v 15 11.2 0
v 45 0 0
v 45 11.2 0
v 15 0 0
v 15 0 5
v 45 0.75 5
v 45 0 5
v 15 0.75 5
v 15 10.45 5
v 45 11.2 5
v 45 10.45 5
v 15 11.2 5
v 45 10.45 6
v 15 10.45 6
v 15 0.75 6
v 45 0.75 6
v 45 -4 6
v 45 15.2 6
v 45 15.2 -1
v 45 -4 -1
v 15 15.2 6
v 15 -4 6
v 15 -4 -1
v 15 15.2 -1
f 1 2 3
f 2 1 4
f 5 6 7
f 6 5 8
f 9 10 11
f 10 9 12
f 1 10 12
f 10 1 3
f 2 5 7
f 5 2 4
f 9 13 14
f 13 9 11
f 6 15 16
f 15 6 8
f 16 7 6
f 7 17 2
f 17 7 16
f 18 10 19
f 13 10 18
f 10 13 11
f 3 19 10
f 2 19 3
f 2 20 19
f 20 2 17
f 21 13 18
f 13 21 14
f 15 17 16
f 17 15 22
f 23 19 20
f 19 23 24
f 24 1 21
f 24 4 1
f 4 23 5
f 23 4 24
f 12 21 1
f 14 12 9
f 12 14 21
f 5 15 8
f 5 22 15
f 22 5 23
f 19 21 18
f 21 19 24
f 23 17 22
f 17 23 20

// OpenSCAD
ease=.2;
feetZ = 5;
feetH = 11+ease;
featfeetZ=feetZ+2;
featfeetH=4;


module feetShape(){
	polygon(points=[[0,0],
					[60,0],
					[50,14],
					[47,feetH],
					[13,feetH],
					[10,14]]
					);
}


module featfeet(){
	translate([15,-featfeetH,-1]) cube([30,feetH+featfeetH*2,featfeetZ]);
}



difference(){
	featfeet();

	union(){
		color("red") linear_extrude(feetZ) feetShape(0);
		#translate([0,.75,0]) cube([100,feetH-1.5,10]);
	}
}
